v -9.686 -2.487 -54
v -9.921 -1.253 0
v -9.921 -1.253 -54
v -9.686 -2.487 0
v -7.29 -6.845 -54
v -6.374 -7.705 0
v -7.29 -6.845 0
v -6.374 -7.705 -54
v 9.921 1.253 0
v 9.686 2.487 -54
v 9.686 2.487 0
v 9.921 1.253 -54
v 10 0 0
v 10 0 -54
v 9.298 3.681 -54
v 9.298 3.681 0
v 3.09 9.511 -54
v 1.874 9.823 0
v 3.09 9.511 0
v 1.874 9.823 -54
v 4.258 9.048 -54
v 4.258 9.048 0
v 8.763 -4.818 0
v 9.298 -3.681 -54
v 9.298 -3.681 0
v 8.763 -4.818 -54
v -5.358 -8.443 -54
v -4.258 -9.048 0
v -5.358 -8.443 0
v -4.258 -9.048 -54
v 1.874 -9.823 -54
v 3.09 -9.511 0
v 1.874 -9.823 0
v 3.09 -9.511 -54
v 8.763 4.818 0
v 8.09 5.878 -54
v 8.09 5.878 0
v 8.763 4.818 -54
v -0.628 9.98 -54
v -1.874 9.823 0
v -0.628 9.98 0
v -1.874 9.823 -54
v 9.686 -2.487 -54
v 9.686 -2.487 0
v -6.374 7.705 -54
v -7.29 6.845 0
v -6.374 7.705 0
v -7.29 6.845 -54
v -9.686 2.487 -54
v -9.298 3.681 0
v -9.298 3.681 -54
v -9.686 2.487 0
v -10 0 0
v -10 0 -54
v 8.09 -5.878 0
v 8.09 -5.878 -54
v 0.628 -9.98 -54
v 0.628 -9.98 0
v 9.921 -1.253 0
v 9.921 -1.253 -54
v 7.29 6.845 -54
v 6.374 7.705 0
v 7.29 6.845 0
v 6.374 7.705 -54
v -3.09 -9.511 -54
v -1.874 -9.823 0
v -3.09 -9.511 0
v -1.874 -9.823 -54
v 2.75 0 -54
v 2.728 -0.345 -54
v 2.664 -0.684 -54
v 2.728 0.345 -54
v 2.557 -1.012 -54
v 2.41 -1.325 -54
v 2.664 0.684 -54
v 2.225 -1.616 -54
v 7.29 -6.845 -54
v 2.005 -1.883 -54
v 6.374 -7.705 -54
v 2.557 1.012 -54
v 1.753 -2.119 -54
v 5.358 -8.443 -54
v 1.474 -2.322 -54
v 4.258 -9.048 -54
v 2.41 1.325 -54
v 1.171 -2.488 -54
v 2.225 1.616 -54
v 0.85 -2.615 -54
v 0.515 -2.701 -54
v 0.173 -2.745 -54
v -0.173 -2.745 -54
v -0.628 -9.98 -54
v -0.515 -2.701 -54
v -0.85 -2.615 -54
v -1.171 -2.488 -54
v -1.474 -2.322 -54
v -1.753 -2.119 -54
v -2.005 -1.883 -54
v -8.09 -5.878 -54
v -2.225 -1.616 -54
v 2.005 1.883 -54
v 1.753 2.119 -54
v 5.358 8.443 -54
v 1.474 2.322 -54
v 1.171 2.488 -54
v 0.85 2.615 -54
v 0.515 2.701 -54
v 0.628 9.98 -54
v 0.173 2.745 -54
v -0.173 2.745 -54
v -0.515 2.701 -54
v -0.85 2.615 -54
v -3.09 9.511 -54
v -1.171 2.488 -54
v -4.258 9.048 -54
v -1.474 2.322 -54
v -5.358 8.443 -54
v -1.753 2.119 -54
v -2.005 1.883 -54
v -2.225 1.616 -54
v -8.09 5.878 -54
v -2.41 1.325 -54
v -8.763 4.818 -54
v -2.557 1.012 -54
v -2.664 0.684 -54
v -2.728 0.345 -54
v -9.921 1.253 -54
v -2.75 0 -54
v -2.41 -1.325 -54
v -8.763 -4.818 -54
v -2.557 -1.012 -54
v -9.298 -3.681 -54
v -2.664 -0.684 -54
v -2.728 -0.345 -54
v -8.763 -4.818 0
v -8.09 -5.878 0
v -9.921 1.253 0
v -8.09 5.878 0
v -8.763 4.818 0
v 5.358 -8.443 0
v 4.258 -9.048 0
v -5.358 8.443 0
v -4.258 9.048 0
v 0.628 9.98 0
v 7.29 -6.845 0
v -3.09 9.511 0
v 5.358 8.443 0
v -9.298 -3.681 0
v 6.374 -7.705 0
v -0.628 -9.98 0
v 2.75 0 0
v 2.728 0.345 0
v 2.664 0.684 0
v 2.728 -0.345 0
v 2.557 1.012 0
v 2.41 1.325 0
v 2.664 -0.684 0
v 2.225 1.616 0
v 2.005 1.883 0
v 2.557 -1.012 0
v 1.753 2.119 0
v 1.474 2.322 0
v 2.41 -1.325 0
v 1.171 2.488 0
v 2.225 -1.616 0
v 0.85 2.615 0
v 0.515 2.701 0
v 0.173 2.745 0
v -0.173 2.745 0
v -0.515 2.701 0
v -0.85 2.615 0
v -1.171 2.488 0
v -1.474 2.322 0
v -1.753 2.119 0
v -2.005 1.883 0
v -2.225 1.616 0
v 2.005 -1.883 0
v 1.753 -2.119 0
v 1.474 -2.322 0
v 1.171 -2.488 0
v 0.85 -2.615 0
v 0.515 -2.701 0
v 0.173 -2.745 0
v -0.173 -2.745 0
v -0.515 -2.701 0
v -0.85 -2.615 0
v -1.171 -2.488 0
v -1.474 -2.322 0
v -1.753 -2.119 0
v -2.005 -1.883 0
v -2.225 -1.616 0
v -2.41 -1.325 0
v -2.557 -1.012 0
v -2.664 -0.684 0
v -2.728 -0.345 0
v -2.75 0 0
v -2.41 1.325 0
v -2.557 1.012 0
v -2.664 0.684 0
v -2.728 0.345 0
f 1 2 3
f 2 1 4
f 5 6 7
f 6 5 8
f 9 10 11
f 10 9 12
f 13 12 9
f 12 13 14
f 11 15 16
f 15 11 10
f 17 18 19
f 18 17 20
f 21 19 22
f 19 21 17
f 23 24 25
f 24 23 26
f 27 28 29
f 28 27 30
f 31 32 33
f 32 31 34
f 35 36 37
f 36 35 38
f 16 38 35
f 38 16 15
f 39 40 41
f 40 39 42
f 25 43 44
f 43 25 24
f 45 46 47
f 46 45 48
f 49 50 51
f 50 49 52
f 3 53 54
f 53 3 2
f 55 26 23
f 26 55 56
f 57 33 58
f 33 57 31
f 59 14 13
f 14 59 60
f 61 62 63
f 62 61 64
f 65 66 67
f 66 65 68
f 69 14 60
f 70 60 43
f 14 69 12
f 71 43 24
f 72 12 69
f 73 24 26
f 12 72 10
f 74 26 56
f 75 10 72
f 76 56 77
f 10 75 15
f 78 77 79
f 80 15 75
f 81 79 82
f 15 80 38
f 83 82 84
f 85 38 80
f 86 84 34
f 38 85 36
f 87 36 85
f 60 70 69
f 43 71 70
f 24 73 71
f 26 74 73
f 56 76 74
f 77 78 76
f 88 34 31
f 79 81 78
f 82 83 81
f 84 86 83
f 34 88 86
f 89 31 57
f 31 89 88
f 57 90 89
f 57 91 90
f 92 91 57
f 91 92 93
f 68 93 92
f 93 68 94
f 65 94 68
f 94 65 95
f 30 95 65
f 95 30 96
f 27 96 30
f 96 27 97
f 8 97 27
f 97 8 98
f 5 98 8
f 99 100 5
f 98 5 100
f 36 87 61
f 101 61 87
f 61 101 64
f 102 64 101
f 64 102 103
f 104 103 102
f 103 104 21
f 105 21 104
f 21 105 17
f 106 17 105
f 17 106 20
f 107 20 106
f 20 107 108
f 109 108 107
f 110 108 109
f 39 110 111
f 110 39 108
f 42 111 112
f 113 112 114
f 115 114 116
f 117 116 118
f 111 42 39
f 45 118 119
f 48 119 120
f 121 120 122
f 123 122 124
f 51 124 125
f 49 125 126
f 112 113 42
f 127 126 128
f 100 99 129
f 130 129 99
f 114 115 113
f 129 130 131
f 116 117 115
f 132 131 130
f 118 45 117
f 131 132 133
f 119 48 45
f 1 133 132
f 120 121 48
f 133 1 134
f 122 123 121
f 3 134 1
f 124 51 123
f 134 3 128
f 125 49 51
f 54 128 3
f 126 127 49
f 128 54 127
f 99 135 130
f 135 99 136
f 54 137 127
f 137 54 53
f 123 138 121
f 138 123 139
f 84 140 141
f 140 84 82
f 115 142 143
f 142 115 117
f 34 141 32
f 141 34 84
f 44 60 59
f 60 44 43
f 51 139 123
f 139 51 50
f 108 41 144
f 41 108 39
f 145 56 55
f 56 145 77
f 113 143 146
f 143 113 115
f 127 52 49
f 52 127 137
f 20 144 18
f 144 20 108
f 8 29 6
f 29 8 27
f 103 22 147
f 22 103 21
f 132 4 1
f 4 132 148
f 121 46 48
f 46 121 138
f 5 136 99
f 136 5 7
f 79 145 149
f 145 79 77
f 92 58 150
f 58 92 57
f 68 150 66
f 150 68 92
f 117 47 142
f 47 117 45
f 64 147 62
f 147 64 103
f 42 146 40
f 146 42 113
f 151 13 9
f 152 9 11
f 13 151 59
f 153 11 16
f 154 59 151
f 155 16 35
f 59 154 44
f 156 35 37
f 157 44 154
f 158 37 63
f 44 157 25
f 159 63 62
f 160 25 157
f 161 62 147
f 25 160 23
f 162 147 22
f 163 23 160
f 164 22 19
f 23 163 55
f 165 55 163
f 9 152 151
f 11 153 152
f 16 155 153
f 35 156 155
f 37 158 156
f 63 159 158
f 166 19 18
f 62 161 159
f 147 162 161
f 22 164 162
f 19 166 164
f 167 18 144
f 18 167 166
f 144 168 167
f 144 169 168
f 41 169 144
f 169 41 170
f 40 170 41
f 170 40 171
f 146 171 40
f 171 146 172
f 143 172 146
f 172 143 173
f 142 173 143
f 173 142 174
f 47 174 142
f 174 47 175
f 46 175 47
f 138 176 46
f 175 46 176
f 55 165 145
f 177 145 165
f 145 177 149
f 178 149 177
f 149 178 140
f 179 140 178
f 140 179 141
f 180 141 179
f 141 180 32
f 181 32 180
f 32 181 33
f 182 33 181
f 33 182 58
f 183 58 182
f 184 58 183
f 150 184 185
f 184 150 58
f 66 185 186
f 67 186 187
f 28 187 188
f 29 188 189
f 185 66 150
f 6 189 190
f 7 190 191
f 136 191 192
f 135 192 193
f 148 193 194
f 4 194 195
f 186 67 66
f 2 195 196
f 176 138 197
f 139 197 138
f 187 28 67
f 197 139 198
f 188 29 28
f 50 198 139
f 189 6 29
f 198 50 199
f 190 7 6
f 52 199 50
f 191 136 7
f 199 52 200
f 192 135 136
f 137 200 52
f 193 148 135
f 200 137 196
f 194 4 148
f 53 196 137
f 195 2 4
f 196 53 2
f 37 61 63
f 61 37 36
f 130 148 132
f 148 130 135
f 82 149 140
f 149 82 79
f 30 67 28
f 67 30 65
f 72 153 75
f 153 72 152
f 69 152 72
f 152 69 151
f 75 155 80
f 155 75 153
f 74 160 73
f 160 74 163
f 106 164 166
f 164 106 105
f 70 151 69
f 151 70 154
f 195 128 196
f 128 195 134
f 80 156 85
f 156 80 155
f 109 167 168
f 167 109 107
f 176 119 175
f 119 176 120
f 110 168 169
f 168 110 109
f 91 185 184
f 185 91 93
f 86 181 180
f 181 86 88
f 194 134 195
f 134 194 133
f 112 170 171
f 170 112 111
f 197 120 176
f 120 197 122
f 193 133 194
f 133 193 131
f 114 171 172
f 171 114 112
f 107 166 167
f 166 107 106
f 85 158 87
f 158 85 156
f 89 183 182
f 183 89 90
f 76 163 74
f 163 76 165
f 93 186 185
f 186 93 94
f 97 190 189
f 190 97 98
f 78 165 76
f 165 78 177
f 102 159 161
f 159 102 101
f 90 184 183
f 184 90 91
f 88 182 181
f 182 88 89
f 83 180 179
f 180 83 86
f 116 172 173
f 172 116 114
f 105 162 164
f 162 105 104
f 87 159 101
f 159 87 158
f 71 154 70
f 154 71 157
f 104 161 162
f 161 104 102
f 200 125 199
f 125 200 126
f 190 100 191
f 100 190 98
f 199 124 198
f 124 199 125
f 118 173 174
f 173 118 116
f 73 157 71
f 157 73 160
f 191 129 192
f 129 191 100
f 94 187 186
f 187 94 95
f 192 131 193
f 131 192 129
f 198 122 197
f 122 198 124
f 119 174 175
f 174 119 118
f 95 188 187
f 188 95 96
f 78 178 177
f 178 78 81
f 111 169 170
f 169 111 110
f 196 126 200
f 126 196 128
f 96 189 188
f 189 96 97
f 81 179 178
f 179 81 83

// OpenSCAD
$fn = 50;


difference() {
	union() {
		translate(v = [0, 0, -54.0000000000]) {
			cylinder(h = 54, r = 10.0000000000);
		}
		cylinder(h = 0, r = 13.0000000000);
	}
	union() {
		#translate(v = [0, 0, -54]) {
			cylinder(h = 54, r = 2.7500000000);
		}
	}
}
